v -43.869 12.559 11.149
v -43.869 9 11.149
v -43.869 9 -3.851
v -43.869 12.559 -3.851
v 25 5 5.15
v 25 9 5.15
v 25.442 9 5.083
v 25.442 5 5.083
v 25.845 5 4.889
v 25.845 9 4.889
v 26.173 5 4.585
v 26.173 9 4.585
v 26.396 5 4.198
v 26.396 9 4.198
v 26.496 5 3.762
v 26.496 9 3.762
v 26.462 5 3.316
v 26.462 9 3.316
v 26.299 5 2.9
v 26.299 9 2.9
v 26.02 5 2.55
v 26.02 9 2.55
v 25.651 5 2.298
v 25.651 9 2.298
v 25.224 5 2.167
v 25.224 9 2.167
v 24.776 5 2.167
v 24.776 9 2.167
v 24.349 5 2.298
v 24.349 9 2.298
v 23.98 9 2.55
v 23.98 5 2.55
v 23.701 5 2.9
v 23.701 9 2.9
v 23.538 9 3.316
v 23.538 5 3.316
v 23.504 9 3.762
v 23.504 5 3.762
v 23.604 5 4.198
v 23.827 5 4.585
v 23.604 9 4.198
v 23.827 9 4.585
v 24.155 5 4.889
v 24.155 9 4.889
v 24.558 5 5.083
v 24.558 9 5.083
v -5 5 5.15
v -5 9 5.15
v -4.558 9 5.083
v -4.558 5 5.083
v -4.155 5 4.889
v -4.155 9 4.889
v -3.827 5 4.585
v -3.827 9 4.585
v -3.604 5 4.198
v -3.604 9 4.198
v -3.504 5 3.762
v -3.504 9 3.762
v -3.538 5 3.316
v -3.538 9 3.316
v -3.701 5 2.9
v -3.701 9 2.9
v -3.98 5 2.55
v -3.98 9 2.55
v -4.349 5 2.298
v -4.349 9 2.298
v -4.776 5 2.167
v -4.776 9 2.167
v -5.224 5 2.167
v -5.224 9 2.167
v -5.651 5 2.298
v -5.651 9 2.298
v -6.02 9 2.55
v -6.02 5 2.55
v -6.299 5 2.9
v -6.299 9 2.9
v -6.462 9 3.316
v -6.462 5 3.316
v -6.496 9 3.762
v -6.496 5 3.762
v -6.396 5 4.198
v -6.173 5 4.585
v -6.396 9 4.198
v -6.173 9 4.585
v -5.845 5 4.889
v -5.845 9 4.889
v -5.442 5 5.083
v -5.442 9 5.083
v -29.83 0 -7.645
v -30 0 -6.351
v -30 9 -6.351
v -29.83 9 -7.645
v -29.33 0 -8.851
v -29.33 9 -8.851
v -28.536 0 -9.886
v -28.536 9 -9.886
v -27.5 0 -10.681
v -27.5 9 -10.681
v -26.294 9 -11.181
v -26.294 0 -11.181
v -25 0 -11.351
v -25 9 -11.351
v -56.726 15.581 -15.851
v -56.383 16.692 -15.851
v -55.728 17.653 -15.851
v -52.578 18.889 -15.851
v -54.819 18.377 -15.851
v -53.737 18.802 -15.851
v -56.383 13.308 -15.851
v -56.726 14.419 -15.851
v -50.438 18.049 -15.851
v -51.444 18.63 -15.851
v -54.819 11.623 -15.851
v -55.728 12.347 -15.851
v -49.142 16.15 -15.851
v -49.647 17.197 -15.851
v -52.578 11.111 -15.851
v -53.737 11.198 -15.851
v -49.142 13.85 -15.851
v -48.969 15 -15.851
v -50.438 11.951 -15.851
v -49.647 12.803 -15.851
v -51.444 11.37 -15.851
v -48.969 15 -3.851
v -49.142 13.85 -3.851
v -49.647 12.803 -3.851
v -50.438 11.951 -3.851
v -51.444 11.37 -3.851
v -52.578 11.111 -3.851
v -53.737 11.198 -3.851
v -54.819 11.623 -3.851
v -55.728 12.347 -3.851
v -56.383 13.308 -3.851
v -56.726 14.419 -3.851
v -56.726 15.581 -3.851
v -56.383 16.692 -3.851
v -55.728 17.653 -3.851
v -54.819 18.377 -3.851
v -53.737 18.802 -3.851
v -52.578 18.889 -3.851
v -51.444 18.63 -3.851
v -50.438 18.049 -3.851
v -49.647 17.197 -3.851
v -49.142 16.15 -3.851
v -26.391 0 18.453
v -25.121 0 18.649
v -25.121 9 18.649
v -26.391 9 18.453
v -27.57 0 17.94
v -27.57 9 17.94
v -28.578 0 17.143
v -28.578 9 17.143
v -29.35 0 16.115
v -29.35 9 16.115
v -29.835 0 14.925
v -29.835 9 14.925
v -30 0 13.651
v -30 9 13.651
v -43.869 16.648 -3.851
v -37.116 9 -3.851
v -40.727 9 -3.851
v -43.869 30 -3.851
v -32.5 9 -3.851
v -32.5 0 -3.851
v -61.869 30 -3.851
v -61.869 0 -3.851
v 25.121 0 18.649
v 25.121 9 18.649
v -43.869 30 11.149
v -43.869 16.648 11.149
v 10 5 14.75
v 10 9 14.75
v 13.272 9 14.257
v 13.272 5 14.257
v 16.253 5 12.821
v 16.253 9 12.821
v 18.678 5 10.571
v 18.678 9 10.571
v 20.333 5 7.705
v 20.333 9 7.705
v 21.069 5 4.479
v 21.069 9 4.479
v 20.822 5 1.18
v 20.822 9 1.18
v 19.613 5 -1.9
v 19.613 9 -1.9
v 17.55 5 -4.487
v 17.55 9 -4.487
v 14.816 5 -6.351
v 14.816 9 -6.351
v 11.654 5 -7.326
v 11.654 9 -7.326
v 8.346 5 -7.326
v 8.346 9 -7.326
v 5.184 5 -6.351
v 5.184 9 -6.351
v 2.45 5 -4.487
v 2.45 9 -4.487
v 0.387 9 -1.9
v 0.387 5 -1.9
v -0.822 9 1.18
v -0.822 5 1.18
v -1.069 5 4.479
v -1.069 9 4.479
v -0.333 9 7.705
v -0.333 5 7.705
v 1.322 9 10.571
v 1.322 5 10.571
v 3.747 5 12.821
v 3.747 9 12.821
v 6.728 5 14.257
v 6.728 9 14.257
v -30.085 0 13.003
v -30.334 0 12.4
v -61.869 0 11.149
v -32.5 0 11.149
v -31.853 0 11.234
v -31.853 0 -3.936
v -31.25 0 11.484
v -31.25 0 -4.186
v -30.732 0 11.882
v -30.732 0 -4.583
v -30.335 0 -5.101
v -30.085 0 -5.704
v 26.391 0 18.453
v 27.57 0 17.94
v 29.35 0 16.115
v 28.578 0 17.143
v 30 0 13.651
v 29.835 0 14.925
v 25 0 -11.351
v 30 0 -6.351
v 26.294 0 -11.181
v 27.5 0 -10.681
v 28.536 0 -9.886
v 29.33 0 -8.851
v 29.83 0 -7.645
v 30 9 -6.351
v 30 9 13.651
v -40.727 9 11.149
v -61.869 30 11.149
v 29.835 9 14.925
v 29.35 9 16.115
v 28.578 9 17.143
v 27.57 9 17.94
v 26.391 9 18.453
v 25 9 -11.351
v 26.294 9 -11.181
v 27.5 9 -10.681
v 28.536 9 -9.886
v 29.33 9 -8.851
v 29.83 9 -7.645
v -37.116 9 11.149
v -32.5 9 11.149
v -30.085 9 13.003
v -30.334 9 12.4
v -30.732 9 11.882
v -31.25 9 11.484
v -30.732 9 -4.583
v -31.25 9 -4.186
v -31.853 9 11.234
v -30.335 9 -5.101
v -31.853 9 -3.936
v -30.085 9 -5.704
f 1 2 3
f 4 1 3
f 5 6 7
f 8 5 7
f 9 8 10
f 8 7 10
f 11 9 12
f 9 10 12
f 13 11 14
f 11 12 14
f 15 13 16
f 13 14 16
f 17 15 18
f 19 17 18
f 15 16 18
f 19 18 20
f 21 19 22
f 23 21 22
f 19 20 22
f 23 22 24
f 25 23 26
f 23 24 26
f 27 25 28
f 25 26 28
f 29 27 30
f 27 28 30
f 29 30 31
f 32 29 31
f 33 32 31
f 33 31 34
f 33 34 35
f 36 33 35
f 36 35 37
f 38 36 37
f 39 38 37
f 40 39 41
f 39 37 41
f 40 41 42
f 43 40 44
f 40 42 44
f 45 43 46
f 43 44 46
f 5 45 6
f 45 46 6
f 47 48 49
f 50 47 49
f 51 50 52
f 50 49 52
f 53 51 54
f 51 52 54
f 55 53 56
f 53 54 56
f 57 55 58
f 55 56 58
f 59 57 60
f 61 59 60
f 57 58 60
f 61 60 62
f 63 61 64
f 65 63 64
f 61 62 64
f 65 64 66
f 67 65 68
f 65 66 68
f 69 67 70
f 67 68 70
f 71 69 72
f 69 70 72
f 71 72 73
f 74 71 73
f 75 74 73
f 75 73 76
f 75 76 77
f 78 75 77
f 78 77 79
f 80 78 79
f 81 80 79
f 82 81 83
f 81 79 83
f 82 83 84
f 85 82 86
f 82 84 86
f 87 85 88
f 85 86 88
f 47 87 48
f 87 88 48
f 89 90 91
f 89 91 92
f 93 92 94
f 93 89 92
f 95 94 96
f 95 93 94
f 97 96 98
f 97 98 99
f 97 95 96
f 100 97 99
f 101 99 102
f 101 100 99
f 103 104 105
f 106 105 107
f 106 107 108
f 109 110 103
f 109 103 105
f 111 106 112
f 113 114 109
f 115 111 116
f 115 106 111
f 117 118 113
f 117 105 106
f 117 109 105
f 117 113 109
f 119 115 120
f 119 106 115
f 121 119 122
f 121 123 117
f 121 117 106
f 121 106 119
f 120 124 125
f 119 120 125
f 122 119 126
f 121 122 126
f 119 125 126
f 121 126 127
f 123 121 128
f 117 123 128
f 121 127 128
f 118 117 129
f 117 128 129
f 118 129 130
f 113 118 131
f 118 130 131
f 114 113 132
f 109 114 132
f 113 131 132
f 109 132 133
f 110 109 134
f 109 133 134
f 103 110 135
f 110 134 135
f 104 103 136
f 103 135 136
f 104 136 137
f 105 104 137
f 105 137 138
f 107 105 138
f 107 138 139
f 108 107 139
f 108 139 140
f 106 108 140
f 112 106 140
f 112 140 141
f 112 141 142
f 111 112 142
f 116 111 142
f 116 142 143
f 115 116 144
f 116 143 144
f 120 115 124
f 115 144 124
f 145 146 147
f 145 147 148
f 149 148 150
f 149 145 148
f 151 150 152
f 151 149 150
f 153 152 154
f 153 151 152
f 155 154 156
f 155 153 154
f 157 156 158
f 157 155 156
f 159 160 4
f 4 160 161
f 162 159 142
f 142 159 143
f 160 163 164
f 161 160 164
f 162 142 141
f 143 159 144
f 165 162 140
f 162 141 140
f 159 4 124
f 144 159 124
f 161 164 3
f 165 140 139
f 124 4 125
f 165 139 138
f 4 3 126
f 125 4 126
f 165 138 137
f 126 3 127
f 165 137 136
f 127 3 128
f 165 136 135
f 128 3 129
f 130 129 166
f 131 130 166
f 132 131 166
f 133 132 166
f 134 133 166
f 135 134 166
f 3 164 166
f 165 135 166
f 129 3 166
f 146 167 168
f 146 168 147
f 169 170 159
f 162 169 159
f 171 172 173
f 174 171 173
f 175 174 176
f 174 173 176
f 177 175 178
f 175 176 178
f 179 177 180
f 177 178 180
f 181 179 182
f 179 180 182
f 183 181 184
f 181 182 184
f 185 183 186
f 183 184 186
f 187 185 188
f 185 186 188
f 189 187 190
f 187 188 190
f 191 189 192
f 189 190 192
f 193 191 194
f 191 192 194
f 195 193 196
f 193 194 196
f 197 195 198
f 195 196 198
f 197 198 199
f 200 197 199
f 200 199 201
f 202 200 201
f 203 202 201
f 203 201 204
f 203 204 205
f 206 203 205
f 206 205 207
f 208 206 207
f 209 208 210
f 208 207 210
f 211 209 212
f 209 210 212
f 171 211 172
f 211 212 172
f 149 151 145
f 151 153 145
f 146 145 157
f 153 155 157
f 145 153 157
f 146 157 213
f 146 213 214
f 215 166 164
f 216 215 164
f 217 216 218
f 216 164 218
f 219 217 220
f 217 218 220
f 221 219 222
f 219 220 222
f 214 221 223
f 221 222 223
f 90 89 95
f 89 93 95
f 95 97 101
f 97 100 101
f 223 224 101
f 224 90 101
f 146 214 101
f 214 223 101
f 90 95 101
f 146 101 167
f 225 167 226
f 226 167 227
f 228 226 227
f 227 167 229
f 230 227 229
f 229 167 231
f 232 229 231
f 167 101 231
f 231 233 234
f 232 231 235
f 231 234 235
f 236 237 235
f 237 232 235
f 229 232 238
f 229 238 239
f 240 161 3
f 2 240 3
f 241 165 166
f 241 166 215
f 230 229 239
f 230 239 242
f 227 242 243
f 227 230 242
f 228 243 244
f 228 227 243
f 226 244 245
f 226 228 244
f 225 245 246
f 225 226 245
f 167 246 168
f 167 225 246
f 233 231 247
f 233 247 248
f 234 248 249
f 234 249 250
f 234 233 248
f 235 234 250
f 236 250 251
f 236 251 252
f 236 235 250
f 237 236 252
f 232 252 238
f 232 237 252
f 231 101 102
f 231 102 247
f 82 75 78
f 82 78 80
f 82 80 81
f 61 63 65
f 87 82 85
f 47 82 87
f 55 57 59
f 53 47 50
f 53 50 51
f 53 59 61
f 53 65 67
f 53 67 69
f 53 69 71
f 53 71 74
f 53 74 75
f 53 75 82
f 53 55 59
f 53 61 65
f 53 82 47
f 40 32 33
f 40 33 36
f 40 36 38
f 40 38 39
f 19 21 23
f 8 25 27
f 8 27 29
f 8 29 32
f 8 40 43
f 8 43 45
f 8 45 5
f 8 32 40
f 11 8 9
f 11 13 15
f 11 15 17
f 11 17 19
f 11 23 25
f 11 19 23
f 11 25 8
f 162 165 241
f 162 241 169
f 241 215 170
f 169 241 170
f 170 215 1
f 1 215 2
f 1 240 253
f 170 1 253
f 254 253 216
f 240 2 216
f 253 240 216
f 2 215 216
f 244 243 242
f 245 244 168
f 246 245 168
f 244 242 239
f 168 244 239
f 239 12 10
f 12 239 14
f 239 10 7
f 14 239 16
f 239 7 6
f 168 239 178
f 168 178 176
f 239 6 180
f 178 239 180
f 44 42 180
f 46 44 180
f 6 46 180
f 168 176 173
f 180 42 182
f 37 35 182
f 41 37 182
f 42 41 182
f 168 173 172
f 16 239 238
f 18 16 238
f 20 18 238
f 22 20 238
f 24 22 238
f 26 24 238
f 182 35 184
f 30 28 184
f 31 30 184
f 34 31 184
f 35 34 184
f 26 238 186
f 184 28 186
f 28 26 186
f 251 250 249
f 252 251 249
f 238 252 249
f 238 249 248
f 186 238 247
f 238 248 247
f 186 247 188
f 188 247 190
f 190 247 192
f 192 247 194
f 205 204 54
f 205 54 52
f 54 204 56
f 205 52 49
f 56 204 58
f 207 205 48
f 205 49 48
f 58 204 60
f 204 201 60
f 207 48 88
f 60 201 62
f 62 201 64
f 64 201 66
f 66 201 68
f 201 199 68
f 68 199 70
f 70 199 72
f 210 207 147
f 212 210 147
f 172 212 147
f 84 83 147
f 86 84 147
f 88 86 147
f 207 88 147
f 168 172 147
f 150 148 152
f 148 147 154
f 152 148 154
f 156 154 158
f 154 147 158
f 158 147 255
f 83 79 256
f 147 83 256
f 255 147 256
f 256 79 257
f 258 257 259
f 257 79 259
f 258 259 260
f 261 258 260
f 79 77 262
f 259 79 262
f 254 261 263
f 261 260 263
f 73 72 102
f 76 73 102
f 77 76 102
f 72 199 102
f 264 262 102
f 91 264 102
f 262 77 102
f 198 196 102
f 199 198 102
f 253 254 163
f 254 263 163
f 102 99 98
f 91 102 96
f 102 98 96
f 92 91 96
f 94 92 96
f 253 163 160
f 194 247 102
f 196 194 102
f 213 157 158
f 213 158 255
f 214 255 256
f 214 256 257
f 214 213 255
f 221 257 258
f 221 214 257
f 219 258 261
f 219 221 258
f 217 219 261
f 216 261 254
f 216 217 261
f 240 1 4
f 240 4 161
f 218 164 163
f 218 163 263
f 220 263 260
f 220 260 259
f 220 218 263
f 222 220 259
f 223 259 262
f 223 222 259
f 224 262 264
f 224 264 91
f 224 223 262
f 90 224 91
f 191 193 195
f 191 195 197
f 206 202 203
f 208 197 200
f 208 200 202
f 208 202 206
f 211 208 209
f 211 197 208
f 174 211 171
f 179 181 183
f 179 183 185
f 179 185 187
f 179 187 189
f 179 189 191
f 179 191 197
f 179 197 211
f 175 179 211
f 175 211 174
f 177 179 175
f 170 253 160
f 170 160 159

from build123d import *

# Parameters (mm, degrees)
BOSS_EXTRUDE1_DEPTH = 9
SKETCH3_R           = 11.1
SKETCH3_R_2         = 1.5
CUT_EXTRUDE1_DEPTH  = 4
BOSS_EXTRUDE2_DEPTH = 30
BOSS_EXTRUDE4_DEPTH = 15
SKETCH7_R           = 3.9
BOSS_EXTRUDE5_DEPTH = 12


with BuildPart() as part:
    # Sketch1 → Boss-Extrude1 (new body)
    with BuildSketch(Plane(origin=(0, 0, 0), x_dir=(1, 0, 0), z_dir=(0, 1, 0))):
        with BuildLine():
            Line((-25, 11.350947881), (25, 11.350947881))
            ThreePointArc((25, 11.350947881), (28.535533906, 9.886481787), (30, 6.350947881))
            Line((30, 6.350947881), (30, -13.650519031))
            ThreePointArc((30, -13.650519031), (28.578095606, -17.142972586), (25.121107266, -18.649052119))
            Line((25.121107266, -18.649052119), (-25.121107266, -18.649052119))
            ThreePointArc((-25.121107266, -18.649052119), (-28.578095606, -17.142972586), (-30, -13.650519031))
            ThreePointArc((-30, -13.650519031), (-30.731714061, -11.881803874), (-32.49999957, -11.149052119))
            Line((-32.49999957, -11.149052119), (-43.869213178, -11.149052119))
            Line((-43.869213178, -11.149052119), (-43.869213178, 3.850947881))
            Line((-43.869213178, 3.850947881), (-32.5, 3.850947881))
            ThreePointArc((-32.5, 3.850947881), (-30.732233047, 4.583180928), (-30, 6.350947881))
            ThreePointArc((-30, 6.350947881), (-28.535533906, 9.886481787), (-25, 11.350947881))
        make_face()
    extrude(amount=BOSS_EXTRUDE1_DEPTH)

    # Sketch3 → Cut-Extrude1 (cut)
    with BuildSketch(Plane(origin=(0, 9, 0), x_dir=(1, 0, 0), z_dir=(0, 1, 0))):
        with Locations(Location((10, -3.649785575, 0), (0, 0, 270))):
            Circle(SKETCH3_R)
        with Locations(Location((-5, -3.649785575, 0), (0, 0, 270))):
            Circle(SKETCH3_R_2)
        with Locations(Location((25, -3.649785575, 0), (0, 0, 270))):
            Circle(SKETCH3_R_2)
    extrude(amount=-CUT_EXTRUDE1_DEPTH, mode=Mode.SUBTRACT)

    # Sketch2 → Boss-Extrude2 (add)
    with BuildSketch(Plane(origin=(0, 0, 0), x_dir=(1, 0, 0), z_dir=(0, 1, 0))):
        Polygon((-59.869213178, -11.149052119), (-45.869213178, -11.149052119), (-43.869213178, -11.149052119), (-43.869213178, -9.149052119), (-43.869213178, -4.149052119), (-43.869213178, 3.850947881), (-45.869213178, 3.850947881), (-59.869213178, 3.850947881), (-61.869213178, 3.850947881), (-61.869213178, -9.149052119), (-61.869213178, -11.149052119), align=None)
    extrude(amount=BOSS_EXTRUDE2_DEPTH)

    # Sketch6 → Boss-Extrude4 (add)
    with BuildSketch(Plane.XY.offset(11.149052119)):
        Polygon((-43.869213178, 12.558501201), (-40.727008234, 9), (-37.115574999, 9), (-43.869213178, 16.648396589), align=None)
    extrude(amount=-BOSS_EXTRUDE4_DEPTH)

    # Sketch7 → Boss-Extrude5 (add)
    with BuildSketch(Plane(origin=(0, 0, -3.850947881), x_dir=(-1, 0, 0), z_dir=(0, 0, -1))):
        with Locations(Location((52.869213178, 15, 0), (0, 0, 180))):
            Circle(SKETCH7_R)
    extrude(amount=BOSS_EXTRUDE5_DEPTH)


solid = part.part
